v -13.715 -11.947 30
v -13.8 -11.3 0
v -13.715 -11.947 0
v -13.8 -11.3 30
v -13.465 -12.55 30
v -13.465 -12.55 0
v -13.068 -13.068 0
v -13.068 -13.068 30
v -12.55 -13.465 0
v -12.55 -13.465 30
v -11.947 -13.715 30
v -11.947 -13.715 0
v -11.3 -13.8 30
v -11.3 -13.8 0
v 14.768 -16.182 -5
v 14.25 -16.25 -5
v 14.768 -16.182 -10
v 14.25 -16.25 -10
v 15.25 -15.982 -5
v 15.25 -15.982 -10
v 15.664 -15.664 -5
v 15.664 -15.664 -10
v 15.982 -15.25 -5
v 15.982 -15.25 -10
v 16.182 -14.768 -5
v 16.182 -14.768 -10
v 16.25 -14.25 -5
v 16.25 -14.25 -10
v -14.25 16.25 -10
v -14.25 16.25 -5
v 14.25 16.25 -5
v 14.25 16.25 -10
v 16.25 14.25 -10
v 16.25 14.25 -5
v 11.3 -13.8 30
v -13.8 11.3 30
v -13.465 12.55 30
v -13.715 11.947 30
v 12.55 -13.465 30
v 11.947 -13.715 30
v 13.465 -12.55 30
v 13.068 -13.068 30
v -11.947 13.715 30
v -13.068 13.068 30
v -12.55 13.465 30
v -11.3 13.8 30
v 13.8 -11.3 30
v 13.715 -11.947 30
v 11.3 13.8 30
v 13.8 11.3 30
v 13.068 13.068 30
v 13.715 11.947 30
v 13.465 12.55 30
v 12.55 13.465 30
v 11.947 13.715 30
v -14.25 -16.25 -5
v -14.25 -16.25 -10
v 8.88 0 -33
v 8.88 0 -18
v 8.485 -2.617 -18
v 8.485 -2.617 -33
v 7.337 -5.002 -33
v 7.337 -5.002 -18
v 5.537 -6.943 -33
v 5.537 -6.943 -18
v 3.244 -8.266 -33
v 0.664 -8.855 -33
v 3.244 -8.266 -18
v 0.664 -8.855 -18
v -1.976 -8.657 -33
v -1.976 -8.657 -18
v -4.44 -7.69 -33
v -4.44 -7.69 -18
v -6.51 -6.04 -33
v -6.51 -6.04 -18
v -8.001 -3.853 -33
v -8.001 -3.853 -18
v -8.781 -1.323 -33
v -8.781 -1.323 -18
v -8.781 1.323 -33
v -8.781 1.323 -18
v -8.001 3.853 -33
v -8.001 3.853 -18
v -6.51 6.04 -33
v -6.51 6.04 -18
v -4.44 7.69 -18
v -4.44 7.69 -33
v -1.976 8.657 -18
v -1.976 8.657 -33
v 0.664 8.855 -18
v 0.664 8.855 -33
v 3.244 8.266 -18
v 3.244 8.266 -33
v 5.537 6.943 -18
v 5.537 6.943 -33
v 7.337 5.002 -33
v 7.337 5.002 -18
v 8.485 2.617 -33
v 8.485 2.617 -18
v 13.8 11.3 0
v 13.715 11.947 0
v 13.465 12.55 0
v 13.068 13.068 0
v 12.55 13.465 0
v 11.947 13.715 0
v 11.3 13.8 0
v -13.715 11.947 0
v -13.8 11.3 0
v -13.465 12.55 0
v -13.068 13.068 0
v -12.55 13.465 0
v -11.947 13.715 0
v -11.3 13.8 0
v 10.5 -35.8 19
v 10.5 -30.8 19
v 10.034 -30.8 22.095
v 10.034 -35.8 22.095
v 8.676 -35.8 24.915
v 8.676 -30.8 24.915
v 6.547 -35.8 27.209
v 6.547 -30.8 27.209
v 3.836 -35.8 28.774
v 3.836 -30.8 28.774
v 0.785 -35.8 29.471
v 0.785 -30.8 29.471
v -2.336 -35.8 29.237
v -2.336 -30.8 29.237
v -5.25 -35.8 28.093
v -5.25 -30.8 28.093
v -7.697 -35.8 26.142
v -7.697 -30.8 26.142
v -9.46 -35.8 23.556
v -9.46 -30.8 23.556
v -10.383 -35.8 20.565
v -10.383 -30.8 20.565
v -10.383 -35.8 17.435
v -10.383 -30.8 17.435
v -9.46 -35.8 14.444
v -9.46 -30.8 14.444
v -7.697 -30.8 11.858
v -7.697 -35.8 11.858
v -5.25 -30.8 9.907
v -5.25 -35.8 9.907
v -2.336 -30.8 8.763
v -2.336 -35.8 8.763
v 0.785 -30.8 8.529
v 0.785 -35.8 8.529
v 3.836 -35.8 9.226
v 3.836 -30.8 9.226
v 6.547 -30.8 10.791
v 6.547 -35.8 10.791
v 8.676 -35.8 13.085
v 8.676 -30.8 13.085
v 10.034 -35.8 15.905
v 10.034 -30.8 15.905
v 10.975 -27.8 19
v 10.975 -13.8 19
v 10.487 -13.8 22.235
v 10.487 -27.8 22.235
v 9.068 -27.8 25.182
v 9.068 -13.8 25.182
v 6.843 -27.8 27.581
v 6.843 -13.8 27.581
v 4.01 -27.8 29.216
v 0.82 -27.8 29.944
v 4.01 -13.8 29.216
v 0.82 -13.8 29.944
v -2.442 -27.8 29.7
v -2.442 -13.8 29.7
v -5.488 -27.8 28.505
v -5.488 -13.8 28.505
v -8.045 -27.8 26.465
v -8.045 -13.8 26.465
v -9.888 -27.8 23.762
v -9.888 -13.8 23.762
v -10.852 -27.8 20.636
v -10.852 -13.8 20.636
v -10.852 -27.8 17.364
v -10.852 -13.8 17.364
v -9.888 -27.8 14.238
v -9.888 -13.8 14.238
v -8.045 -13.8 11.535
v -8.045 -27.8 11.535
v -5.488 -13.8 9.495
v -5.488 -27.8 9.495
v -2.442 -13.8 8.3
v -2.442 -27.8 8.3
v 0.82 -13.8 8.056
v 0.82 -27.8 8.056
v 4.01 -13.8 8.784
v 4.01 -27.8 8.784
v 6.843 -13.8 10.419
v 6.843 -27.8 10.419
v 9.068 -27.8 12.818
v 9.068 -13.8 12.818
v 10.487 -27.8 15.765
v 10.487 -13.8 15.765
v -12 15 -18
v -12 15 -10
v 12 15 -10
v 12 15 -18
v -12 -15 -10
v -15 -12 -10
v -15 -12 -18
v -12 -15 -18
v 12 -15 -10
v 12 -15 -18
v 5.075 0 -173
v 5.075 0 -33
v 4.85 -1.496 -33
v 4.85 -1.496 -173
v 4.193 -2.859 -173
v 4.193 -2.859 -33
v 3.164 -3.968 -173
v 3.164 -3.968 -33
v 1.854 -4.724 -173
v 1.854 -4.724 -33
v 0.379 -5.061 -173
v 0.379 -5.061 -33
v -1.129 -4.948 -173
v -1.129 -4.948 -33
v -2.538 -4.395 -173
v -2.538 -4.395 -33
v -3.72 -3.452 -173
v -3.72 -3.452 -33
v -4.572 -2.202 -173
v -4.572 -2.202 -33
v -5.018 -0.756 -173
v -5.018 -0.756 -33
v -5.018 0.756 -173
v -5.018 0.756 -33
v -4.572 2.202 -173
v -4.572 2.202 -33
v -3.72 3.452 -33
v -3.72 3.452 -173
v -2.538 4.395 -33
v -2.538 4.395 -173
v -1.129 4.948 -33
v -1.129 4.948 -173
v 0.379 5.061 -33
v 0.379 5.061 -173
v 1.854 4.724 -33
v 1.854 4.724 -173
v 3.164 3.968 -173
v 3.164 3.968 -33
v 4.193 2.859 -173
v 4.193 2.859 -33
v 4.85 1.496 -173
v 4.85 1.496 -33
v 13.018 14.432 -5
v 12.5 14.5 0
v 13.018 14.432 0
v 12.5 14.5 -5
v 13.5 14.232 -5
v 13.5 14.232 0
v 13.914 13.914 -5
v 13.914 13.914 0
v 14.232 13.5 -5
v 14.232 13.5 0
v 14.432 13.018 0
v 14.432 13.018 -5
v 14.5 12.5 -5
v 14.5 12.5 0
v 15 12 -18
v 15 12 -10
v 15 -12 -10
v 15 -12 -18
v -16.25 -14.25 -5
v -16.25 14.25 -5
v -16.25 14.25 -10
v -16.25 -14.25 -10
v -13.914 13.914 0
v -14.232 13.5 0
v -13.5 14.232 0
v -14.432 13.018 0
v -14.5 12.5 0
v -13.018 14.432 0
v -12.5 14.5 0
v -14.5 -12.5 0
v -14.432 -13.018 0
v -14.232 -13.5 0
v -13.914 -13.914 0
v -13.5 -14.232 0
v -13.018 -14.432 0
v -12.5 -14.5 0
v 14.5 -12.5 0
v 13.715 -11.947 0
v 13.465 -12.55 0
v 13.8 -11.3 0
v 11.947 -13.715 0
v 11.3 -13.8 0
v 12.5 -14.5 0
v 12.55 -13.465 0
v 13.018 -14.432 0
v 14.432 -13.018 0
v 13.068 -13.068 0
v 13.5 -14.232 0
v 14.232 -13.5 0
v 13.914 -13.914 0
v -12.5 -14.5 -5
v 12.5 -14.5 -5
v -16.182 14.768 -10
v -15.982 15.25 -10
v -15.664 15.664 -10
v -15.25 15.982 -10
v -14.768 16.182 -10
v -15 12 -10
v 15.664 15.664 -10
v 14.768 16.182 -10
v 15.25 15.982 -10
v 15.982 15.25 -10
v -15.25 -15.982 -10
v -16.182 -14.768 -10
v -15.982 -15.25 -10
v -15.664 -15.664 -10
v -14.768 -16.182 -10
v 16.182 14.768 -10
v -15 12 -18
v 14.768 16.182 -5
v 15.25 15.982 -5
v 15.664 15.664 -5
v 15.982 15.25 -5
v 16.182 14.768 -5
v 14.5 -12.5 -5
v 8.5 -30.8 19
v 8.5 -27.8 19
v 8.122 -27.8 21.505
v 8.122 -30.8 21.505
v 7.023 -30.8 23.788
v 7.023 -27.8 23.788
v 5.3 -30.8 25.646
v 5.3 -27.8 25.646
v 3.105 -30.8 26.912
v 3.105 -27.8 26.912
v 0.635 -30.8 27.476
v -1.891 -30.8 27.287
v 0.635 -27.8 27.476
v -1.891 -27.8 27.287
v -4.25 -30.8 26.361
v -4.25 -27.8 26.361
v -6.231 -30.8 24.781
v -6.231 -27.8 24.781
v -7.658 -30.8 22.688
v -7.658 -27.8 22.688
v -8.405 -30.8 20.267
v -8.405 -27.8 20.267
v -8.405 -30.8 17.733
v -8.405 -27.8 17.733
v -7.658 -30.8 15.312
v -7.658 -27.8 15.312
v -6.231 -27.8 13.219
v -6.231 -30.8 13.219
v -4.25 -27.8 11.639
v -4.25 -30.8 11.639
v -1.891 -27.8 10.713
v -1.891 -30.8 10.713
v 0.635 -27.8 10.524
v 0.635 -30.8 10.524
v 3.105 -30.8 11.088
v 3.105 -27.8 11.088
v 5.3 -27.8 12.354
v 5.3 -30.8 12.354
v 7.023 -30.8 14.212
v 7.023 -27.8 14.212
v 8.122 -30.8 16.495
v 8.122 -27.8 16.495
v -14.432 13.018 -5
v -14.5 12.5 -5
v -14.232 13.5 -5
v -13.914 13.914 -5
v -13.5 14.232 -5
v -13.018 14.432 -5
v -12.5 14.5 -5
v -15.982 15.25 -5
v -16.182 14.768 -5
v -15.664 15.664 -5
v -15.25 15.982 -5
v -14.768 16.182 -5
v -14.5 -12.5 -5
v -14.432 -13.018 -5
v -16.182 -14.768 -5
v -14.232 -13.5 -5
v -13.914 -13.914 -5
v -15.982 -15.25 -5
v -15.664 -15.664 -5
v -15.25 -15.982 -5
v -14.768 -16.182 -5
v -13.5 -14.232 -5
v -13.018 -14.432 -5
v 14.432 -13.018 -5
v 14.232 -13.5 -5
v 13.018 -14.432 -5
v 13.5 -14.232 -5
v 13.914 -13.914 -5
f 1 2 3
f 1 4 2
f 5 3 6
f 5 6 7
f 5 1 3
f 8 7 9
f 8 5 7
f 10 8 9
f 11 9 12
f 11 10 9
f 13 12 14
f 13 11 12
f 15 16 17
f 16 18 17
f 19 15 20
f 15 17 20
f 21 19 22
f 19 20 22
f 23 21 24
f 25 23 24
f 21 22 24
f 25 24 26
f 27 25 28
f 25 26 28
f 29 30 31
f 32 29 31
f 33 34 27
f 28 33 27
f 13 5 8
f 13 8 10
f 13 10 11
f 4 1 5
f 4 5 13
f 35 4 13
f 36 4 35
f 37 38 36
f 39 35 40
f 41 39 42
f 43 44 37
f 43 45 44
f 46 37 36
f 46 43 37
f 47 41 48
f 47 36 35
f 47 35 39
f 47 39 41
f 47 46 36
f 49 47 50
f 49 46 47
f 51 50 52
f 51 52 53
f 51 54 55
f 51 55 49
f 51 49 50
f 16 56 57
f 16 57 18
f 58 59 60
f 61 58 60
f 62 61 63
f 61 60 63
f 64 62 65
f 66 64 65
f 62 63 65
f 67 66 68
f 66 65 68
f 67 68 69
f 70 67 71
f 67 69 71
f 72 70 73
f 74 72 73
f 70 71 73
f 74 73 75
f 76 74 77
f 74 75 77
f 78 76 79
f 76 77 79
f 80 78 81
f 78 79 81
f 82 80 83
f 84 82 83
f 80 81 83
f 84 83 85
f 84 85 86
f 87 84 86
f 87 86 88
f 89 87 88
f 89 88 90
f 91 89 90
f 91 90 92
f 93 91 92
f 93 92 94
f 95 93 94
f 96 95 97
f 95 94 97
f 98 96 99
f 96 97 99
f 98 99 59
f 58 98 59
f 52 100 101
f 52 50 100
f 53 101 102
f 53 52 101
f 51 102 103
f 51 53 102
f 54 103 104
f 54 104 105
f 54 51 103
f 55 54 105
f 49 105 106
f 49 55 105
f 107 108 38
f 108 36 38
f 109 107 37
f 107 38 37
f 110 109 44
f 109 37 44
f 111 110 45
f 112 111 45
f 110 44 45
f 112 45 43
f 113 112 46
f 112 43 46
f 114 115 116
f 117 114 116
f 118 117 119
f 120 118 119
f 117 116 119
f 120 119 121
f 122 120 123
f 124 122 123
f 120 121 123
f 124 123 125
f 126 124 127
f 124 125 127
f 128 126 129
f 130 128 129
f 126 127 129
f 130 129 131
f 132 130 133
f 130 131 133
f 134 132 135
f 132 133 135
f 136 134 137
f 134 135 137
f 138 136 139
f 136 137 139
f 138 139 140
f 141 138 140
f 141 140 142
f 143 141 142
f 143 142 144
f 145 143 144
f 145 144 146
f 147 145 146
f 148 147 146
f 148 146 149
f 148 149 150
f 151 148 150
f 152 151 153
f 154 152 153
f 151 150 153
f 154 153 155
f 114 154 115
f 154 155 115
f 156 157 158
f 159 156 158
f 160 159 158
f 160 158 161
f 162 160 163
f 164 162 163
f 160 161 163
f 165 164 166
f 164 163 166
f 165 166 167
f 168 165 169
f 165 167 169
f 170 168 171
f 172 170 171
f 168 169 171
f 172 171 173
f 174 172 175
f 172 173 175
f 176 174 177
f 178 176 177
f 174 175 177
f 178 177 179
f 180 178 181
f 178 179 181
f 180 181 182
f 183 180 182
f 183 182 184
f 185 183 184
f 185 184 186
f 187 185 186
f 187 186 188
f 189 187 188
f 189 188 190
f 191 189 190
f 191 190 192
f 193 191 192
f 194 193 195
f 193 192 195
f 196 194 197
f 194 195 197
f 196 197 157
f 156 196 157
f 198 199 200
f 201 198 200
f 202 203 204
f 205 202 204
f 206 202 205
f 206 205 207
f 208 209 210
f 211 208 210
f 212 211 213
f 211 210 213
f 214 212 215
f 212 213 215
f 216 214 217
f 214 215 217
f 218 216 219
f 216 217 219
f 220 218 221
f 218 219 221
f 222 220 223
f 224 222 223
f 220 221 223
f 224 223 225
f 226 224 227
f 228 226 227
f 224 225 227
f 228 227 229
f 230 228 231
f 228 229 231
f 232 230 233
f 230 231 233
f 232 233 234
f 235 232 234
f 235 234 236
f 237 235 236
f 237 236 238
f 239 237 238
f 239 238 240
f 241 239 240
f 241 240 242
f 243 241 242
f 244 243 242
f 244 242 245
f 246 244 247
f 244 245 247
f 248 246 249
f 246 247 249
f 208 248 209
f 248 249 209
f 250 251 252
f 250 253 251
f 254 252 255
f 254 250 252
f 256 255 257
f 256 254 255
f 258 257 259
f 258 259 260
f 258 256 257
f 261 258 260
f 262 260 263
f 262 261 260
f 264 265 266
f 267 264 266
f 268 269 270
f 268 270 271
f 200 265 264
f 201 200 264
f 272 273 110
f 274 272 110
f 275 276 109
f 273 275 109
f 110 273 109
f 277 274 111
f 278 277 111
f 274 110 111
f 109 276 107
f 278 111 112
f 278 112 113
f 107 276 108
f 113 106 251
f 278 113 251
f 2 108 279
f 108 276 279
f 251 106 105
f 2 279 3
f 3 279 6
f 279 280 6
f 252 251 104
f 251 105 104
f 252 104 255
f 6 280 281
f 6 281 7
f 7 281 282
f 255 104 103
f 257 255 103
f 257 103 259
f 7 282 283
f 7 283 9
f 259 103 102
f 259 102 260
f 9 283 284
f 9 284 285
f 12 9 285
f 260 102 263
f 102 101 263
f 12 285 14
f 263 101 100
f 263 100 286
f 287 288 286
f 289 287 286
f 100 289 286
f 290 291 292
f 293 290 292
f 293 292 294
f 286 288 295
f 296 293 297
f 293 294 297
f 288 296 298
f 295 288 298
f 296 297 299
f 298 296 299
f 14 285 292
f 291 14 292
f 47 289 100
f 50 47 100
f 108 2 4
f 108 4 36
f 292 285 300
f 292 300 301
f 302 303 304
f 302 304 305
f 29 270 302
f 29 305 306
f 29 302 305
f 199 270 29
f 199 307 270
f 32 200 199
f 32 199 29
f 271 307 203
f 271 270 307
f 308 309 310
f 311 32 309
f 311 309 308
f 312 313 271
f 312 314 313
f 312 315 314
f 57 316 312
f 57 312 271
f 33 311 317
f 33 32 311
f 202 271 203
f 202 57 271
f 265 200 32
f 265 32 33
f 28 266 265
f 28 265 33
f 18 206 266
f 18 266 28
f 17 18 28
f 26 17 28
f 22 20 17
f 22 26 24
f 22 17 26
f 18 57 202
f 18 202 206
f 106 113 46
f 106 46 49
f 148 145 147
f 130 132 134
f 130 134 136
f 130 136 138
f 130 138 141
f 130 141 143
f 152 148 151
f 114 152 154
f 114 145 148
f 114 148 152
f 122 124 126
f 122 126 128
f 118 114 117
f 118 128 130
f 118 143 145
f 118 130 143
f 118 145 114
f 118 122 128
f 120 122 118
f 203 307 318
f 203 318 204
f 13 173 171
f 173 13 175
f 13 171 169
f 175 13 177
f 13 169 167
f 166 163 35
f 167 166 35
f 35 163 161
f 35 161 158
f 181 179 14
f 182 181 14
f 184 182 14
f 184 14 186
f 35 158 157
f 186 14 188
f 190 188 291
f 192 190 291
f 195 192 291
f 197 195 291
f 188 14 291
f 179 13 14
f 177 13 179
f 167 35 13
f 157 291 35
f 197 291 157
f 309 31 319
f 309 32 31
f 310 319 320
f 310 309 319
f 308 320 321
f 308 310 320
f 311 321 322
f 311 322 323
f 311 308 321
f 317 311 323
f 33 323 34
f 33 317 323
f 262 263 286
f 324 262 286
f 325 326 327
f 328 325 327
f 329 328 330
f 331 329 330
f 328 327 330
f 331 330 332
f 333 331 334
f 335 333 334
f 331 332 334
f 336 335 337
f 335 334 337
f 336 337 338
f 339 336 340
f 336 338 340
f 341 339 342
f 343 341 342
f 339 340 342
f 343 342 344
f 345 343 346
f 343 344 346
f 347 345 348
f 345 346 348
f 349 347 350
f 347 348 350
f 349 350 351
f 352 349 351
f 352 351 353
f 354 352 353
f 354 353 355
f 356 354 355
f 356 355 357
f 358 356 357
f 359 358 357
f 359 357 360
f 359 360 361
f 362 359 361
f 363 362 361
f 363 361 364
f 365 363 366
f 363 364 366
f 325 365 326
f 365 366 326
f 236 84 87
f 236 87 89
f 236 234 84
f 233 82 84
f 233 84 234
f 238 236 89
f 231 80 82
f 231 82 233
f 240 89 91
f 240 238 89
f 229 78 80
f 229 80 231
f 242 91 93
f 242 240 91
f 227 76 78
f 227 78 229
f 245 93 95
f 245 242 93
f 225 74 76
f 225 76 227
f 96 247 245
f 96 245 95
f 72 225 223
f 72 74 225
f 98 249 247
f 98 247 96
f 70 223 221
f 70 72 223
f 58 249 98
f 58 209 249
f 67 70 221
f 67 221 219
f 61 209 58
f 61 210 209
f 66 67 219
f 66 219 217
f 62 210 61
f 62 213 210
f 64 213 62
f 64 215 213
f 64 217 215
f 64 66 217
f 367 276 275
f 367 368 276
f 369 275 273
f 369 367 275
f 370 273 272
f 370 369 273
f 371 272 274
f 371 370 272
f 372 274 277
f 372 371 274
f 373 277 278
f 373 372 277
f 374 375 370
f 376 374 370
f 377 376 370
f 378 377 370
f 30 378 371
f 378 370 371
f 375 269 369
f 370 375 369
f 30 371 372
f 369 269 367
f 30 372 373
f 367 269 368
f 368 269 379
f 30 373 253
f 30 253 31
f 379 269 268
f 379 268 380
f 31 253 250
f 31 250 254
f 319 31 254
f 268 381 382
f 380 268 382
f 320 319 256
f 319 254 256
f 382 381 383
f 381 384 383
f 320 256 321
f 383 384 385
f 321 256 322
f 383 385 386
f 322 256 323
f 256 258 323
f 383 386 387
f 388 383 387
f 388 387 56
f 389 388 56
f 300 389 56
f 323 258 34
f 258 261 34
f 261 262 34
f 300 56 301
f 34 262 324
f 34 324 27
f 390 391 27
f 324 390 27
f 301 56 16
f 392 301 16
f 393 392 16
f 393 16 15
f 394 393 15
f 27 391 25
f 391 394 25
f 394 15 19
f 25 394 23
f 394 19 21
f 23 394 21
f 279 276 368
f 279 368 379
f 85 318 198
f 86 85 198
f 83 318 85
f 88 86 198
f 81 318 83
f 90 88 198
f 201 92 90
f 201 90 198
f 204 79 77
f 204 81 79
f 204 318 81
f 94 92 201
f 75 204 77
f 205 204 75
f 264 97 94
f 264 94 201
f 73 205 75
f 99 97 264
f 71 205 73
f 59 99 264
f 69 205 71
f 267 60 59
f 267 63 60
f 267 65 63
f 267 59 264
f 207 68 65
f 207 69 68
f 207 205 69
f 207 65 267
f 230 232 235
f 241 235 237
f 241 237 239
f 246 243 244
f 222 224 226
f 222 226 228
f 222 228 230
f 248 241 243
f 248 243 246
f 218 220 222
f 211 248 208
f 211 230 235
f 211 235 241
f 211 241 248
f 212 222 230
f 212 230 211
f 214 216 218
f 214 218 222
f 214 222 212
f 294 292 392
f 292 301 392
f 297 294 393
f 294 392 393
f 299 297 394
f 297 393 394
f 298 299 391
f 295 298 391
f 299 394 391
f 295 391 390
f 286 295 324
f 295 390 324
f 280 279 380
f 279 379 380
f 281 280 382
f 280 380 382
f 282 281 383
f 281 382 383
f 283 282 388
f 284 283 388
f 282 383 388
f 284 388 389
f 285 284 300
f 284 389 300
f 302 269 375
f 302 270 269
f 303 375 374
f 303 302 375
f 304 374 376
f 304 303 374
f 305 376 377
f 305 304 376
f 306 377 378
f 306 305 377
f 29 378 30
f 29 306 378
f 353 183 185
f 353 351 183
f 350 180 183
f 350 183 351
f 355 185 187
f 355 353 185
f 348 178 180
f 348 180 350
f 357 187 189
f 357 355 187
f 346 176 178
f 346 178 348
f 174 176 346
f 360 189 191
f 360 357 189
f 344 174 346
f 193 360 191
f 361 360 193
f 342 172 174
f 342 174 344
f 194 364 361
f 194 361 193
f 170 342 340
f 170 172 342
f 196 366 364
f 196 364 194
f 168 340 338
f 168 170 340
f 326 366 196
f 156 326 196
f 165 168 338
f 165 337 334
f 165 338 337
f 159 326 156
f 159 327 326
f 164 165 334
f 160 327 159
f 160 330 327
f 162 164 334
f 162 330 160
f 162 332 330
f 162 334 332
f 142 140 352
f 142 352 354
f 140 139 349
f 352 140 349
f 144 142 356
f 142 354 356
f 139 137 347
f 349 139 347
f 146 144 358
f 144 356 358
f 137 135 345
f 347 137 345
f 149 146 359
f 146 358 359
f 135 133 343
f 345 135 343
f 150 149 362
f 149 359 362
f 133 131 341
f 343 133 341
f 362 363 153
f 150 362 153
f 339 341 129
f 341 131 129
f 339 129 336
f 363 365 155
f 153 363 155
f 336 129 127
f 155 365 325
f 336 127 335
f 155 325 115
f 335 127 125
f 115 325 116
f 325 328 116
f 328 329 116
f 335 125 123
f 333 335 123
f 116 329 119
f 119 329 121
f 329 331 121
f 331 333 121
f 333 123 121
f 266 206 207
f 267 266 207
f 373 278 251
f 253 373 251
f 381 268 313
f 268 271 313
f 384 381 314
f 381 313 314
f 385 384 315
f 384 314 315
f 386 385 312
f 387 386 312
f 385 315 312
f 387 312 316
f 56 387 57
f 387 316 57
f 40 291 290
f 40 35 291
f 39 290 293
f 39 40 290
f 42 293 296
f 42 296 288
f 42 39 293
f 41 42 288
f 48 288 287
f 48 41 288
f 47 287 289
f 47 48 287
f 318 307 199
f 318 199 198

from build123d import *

# Parameters (mm, degrees)
F0_W      = 27.6
F0_H      = 27.6
F1_DEPTH  = 30
F2_R      = 2.5
F3_R      = 10.975
F4_DEPTH  = 14
F5_R      = 8.5
F6_DEPTH  = 3
F7_R      = 10.5
F7_R_2    = 8.5
F8_DEPTH  = 5
F9_W      = 29
F9_H      = 29
F10_DEPTH = 5
F11_R     = 2
F12_W     = 32.5
F12_H     = 32.5
F13_DEPTH = 5
F14_R     = 2
F15_W     = 30
F15_H     = 30
F16_DEPTH = 8
F17_SIZE  = 3
F18_R     = 8.88
F19_DEPTH = 15
F20_R     = 5.075
F21_DEPTH = 140


with BuildPart() as f1:
    # F0 (on Top) → F1 (new body)
    with BuildSketch(Plane.XY):
        Rectangle(F0_W, F0_H)
    extrude(amount=F1_DEPTH)

    # F2
    f2_edges = [f1.edges().sort_by_distance(p)[0] for p in [
        (-13.8, -13.8, 15),
        (13.8, -13.8, 15),
        (13.8, 13.8, 15),
        (-13.8, 13.8, 15),
    ]]
    fillet(f2_edges, radius=F2_R)

    # F3 (on face) → F4 (join)
    with BuildSketch(Plane.XZ.offset(13.8)):
        with Locations((0, 19)):
            Circle(F3_R)
    extrude(amount=F4_DEPTH)

    # F5 (on face) → F6 (join)
    with BuildSketch(Plane.XZ.offset(27.8)):
        with Locations((0, 19)):
            Circle(F5_R)
    extrude(amount=F6_DEPTH)

    # F7 (on face) → F8 (join)
    with BuildSketch(Plane.XZ.offset(30.8)):
        with Locations((0, 19)):
            Circle(F7_R)
        with Locations((0, 19)):
            Circle(F7_R_2, mode=Mode.SUBTRACT)
        with Locations((0, 19)):
            Circle(F7_R_2)
    extrude(amount=F8_DEPTH)

    # F9 (on face) → F10 (join)
    with BuildSketch(Plane(origin=(0, 0, 0), x_dir=(1, 0, 0), z_dir=(0, 0, -1))):
        Rectangle(F9_W, F9_H)
        with BuildLine():
            Line((-11.3, 13.8), (11.3, 13.8))
            ThreePointArc((11.3, 13.8), (13.067766953, 13.067766953), (13.8, 11.3))
            Line((13.8, 11.3), (13.8, -11.3))
            ThreePointArc((13.8, -11.3), (13.067766953, -13.067766953), (11.3, -13.8))
            Line((11.3, -13.8), (-11.3, -13.8))
            ThreePointArc((-11.3, -13.8), (-13.067766953, -13.067766953), (-13.8, -11.3))
            Line((-13.8, -11.3), (-13.8, 11.3))
            ThreePointArc((-13.8, 11.3), (-13.067766953, 13.067766953), (-11.3, 13.8))
        make_face(mode=Mode.SUBTRACT)
        with BuildLine():
            ThreePointArc((13.8, 11.3), (13.067766953, 13.067766953), (11.3, 13.8))
            Line((11.3, 13.8), (-11.3, 13.8))
            ThreePointArc((-11.3, 13.8), (-13.067766953, 13.067766953), (-13.8, 11.3))
            Line((-13.8, 11.3), (-13.8, -11.3))
            ThreePointArc((-13.8, -11.3), (-13.067766953, -13.067766953), (-11.3, -13.8))
            Line((-11.3, -13.8), (11.3, -13.8))
            ThreePointArc((11.3, -13.8), (13.067766953, -13.067766953), (13.8, -11.3))
            Line((13.8, -11.3), (13.8, 11.3))
        make_face()
    extrude(amount=F10_DEPTH)

    # F11
    f11_edges = [f1.edges().sort_by_distance(p)[0] for p in [
        (-14.5, 14.5, -2.5),
        (-14.5, -14.5, -2.5),
        (14.5, -14.5, -2.5),
        (14.5, 14.5, -2.5),
    ]]
    fillet(f11_edges, radius=F11_R)

    # F12 (on face) → F13 (join)
    with BuildSketch(Plane(origin=(0, 0, -5), x_dir=(1, 0, 0), z_dir=(0, 0, -1))):
        Rectangle(F12_W, F12_H)
        with BuildLine():
            Line((12.5, -14.5), (-12.5, -14.5))
            ThreePointArc((-12.5, -14.5), (-13.9142135624, -13.9142135624), (-14.5, -12.5))
            Line((-14.5, -12.5), (-14.5, 12.5))
            ThreePointArc((-14.5, 12.5), (-13.9142135624, 13.9142135624), (-12.5, 14.5))
            Line((-12.5, 14.5), (12.5, 14.5))
            ThreePointArc((12.5, 14.5), (13.9142135624, 13.9142135624), (14.5, 12.5))
            Line((14.5, 12.5), (14.5, -12.5))
            ThreePointArc((14.5, -12.5), (13.9142135624, -13.9142135624), (12.5, -14.5))
        make_face(mode=Mode.SUBTRACT)
        with BuildLine():
            ThreePointArc((-14.5, -12.5), (-13.9142135624, -13.9142135624), (-12.5, -14.5))
            Line((-12.5, -14.5), (12.5, -14.5))
            ThreePointArc((12.5, -14.5), (13.9142135624, -13.9142135624), (14.5, -12.5))
            Line((14.5, -12.5), (14.5, 12.5))
            ThreePointArc((14.5, 12.5), (13.9142135624, 13.9142135624), (12.5, 14.5))
            Line((12.5, 14.5), (-12.5, 14.5))
            ThreePointArc((-12.5, 14.5), (-13.9142135624, 13.9142135624), (-14.5, 12.5))
            Line((-14.5, 12.5), (-14.5, -12.5))
        make_face()
    extrude(amount=F13_DEPTH)

    # F14
    f14_edges = [f1.edges().sort_by_distance(p)[0] for p in [
        (16.25, -16.25, -7.5),
        (16.25, 16.25, -7.5),
        (-16.25, 16.25, -7.5),
        (-16.25, -16.25, -7.5),
    ]]
    fillet(f14_edges, radius=F14_R)

    # F15 (on face) → F16 (join)
    with BuildSketch(Plane(origin=(0, 0, -10), x_dir=(1, 0, 0), z_dir=(0, 0, -1))):
        Rectangle(F15_W, F15_H)
    extrude(amount=F16_DEPTH)

    # F17
    f17_edges = [f1.edges().sort_by_distance(p)[0] for p in [
        (-15, -15, -14),
        (15, -15, -14),
        (15, 15, -14),
        (-15, 15, -14),
    ]]
    chamfer(f17_edges, length=F17_SIZE)

    # F18 (on face) → F19 (join)
    with BuildSketch(Plane(origin=(0, 0, -18), x_dir=(1, 0, 0), z_dir=(0, 0, -1))):
        Circle(F18_R)
    extrude(amount=F19_DEPTH)

    # F20 (on face) → F21 (join)
    with BuildSketch(Plane(origin=(0, 0, -33), x_dir=(1, 0, 0), z_dir=(0, 0, -1))):
        Circle(F20_R)
    extrude(amount=F21_DEPTH)


solid = f1.part
